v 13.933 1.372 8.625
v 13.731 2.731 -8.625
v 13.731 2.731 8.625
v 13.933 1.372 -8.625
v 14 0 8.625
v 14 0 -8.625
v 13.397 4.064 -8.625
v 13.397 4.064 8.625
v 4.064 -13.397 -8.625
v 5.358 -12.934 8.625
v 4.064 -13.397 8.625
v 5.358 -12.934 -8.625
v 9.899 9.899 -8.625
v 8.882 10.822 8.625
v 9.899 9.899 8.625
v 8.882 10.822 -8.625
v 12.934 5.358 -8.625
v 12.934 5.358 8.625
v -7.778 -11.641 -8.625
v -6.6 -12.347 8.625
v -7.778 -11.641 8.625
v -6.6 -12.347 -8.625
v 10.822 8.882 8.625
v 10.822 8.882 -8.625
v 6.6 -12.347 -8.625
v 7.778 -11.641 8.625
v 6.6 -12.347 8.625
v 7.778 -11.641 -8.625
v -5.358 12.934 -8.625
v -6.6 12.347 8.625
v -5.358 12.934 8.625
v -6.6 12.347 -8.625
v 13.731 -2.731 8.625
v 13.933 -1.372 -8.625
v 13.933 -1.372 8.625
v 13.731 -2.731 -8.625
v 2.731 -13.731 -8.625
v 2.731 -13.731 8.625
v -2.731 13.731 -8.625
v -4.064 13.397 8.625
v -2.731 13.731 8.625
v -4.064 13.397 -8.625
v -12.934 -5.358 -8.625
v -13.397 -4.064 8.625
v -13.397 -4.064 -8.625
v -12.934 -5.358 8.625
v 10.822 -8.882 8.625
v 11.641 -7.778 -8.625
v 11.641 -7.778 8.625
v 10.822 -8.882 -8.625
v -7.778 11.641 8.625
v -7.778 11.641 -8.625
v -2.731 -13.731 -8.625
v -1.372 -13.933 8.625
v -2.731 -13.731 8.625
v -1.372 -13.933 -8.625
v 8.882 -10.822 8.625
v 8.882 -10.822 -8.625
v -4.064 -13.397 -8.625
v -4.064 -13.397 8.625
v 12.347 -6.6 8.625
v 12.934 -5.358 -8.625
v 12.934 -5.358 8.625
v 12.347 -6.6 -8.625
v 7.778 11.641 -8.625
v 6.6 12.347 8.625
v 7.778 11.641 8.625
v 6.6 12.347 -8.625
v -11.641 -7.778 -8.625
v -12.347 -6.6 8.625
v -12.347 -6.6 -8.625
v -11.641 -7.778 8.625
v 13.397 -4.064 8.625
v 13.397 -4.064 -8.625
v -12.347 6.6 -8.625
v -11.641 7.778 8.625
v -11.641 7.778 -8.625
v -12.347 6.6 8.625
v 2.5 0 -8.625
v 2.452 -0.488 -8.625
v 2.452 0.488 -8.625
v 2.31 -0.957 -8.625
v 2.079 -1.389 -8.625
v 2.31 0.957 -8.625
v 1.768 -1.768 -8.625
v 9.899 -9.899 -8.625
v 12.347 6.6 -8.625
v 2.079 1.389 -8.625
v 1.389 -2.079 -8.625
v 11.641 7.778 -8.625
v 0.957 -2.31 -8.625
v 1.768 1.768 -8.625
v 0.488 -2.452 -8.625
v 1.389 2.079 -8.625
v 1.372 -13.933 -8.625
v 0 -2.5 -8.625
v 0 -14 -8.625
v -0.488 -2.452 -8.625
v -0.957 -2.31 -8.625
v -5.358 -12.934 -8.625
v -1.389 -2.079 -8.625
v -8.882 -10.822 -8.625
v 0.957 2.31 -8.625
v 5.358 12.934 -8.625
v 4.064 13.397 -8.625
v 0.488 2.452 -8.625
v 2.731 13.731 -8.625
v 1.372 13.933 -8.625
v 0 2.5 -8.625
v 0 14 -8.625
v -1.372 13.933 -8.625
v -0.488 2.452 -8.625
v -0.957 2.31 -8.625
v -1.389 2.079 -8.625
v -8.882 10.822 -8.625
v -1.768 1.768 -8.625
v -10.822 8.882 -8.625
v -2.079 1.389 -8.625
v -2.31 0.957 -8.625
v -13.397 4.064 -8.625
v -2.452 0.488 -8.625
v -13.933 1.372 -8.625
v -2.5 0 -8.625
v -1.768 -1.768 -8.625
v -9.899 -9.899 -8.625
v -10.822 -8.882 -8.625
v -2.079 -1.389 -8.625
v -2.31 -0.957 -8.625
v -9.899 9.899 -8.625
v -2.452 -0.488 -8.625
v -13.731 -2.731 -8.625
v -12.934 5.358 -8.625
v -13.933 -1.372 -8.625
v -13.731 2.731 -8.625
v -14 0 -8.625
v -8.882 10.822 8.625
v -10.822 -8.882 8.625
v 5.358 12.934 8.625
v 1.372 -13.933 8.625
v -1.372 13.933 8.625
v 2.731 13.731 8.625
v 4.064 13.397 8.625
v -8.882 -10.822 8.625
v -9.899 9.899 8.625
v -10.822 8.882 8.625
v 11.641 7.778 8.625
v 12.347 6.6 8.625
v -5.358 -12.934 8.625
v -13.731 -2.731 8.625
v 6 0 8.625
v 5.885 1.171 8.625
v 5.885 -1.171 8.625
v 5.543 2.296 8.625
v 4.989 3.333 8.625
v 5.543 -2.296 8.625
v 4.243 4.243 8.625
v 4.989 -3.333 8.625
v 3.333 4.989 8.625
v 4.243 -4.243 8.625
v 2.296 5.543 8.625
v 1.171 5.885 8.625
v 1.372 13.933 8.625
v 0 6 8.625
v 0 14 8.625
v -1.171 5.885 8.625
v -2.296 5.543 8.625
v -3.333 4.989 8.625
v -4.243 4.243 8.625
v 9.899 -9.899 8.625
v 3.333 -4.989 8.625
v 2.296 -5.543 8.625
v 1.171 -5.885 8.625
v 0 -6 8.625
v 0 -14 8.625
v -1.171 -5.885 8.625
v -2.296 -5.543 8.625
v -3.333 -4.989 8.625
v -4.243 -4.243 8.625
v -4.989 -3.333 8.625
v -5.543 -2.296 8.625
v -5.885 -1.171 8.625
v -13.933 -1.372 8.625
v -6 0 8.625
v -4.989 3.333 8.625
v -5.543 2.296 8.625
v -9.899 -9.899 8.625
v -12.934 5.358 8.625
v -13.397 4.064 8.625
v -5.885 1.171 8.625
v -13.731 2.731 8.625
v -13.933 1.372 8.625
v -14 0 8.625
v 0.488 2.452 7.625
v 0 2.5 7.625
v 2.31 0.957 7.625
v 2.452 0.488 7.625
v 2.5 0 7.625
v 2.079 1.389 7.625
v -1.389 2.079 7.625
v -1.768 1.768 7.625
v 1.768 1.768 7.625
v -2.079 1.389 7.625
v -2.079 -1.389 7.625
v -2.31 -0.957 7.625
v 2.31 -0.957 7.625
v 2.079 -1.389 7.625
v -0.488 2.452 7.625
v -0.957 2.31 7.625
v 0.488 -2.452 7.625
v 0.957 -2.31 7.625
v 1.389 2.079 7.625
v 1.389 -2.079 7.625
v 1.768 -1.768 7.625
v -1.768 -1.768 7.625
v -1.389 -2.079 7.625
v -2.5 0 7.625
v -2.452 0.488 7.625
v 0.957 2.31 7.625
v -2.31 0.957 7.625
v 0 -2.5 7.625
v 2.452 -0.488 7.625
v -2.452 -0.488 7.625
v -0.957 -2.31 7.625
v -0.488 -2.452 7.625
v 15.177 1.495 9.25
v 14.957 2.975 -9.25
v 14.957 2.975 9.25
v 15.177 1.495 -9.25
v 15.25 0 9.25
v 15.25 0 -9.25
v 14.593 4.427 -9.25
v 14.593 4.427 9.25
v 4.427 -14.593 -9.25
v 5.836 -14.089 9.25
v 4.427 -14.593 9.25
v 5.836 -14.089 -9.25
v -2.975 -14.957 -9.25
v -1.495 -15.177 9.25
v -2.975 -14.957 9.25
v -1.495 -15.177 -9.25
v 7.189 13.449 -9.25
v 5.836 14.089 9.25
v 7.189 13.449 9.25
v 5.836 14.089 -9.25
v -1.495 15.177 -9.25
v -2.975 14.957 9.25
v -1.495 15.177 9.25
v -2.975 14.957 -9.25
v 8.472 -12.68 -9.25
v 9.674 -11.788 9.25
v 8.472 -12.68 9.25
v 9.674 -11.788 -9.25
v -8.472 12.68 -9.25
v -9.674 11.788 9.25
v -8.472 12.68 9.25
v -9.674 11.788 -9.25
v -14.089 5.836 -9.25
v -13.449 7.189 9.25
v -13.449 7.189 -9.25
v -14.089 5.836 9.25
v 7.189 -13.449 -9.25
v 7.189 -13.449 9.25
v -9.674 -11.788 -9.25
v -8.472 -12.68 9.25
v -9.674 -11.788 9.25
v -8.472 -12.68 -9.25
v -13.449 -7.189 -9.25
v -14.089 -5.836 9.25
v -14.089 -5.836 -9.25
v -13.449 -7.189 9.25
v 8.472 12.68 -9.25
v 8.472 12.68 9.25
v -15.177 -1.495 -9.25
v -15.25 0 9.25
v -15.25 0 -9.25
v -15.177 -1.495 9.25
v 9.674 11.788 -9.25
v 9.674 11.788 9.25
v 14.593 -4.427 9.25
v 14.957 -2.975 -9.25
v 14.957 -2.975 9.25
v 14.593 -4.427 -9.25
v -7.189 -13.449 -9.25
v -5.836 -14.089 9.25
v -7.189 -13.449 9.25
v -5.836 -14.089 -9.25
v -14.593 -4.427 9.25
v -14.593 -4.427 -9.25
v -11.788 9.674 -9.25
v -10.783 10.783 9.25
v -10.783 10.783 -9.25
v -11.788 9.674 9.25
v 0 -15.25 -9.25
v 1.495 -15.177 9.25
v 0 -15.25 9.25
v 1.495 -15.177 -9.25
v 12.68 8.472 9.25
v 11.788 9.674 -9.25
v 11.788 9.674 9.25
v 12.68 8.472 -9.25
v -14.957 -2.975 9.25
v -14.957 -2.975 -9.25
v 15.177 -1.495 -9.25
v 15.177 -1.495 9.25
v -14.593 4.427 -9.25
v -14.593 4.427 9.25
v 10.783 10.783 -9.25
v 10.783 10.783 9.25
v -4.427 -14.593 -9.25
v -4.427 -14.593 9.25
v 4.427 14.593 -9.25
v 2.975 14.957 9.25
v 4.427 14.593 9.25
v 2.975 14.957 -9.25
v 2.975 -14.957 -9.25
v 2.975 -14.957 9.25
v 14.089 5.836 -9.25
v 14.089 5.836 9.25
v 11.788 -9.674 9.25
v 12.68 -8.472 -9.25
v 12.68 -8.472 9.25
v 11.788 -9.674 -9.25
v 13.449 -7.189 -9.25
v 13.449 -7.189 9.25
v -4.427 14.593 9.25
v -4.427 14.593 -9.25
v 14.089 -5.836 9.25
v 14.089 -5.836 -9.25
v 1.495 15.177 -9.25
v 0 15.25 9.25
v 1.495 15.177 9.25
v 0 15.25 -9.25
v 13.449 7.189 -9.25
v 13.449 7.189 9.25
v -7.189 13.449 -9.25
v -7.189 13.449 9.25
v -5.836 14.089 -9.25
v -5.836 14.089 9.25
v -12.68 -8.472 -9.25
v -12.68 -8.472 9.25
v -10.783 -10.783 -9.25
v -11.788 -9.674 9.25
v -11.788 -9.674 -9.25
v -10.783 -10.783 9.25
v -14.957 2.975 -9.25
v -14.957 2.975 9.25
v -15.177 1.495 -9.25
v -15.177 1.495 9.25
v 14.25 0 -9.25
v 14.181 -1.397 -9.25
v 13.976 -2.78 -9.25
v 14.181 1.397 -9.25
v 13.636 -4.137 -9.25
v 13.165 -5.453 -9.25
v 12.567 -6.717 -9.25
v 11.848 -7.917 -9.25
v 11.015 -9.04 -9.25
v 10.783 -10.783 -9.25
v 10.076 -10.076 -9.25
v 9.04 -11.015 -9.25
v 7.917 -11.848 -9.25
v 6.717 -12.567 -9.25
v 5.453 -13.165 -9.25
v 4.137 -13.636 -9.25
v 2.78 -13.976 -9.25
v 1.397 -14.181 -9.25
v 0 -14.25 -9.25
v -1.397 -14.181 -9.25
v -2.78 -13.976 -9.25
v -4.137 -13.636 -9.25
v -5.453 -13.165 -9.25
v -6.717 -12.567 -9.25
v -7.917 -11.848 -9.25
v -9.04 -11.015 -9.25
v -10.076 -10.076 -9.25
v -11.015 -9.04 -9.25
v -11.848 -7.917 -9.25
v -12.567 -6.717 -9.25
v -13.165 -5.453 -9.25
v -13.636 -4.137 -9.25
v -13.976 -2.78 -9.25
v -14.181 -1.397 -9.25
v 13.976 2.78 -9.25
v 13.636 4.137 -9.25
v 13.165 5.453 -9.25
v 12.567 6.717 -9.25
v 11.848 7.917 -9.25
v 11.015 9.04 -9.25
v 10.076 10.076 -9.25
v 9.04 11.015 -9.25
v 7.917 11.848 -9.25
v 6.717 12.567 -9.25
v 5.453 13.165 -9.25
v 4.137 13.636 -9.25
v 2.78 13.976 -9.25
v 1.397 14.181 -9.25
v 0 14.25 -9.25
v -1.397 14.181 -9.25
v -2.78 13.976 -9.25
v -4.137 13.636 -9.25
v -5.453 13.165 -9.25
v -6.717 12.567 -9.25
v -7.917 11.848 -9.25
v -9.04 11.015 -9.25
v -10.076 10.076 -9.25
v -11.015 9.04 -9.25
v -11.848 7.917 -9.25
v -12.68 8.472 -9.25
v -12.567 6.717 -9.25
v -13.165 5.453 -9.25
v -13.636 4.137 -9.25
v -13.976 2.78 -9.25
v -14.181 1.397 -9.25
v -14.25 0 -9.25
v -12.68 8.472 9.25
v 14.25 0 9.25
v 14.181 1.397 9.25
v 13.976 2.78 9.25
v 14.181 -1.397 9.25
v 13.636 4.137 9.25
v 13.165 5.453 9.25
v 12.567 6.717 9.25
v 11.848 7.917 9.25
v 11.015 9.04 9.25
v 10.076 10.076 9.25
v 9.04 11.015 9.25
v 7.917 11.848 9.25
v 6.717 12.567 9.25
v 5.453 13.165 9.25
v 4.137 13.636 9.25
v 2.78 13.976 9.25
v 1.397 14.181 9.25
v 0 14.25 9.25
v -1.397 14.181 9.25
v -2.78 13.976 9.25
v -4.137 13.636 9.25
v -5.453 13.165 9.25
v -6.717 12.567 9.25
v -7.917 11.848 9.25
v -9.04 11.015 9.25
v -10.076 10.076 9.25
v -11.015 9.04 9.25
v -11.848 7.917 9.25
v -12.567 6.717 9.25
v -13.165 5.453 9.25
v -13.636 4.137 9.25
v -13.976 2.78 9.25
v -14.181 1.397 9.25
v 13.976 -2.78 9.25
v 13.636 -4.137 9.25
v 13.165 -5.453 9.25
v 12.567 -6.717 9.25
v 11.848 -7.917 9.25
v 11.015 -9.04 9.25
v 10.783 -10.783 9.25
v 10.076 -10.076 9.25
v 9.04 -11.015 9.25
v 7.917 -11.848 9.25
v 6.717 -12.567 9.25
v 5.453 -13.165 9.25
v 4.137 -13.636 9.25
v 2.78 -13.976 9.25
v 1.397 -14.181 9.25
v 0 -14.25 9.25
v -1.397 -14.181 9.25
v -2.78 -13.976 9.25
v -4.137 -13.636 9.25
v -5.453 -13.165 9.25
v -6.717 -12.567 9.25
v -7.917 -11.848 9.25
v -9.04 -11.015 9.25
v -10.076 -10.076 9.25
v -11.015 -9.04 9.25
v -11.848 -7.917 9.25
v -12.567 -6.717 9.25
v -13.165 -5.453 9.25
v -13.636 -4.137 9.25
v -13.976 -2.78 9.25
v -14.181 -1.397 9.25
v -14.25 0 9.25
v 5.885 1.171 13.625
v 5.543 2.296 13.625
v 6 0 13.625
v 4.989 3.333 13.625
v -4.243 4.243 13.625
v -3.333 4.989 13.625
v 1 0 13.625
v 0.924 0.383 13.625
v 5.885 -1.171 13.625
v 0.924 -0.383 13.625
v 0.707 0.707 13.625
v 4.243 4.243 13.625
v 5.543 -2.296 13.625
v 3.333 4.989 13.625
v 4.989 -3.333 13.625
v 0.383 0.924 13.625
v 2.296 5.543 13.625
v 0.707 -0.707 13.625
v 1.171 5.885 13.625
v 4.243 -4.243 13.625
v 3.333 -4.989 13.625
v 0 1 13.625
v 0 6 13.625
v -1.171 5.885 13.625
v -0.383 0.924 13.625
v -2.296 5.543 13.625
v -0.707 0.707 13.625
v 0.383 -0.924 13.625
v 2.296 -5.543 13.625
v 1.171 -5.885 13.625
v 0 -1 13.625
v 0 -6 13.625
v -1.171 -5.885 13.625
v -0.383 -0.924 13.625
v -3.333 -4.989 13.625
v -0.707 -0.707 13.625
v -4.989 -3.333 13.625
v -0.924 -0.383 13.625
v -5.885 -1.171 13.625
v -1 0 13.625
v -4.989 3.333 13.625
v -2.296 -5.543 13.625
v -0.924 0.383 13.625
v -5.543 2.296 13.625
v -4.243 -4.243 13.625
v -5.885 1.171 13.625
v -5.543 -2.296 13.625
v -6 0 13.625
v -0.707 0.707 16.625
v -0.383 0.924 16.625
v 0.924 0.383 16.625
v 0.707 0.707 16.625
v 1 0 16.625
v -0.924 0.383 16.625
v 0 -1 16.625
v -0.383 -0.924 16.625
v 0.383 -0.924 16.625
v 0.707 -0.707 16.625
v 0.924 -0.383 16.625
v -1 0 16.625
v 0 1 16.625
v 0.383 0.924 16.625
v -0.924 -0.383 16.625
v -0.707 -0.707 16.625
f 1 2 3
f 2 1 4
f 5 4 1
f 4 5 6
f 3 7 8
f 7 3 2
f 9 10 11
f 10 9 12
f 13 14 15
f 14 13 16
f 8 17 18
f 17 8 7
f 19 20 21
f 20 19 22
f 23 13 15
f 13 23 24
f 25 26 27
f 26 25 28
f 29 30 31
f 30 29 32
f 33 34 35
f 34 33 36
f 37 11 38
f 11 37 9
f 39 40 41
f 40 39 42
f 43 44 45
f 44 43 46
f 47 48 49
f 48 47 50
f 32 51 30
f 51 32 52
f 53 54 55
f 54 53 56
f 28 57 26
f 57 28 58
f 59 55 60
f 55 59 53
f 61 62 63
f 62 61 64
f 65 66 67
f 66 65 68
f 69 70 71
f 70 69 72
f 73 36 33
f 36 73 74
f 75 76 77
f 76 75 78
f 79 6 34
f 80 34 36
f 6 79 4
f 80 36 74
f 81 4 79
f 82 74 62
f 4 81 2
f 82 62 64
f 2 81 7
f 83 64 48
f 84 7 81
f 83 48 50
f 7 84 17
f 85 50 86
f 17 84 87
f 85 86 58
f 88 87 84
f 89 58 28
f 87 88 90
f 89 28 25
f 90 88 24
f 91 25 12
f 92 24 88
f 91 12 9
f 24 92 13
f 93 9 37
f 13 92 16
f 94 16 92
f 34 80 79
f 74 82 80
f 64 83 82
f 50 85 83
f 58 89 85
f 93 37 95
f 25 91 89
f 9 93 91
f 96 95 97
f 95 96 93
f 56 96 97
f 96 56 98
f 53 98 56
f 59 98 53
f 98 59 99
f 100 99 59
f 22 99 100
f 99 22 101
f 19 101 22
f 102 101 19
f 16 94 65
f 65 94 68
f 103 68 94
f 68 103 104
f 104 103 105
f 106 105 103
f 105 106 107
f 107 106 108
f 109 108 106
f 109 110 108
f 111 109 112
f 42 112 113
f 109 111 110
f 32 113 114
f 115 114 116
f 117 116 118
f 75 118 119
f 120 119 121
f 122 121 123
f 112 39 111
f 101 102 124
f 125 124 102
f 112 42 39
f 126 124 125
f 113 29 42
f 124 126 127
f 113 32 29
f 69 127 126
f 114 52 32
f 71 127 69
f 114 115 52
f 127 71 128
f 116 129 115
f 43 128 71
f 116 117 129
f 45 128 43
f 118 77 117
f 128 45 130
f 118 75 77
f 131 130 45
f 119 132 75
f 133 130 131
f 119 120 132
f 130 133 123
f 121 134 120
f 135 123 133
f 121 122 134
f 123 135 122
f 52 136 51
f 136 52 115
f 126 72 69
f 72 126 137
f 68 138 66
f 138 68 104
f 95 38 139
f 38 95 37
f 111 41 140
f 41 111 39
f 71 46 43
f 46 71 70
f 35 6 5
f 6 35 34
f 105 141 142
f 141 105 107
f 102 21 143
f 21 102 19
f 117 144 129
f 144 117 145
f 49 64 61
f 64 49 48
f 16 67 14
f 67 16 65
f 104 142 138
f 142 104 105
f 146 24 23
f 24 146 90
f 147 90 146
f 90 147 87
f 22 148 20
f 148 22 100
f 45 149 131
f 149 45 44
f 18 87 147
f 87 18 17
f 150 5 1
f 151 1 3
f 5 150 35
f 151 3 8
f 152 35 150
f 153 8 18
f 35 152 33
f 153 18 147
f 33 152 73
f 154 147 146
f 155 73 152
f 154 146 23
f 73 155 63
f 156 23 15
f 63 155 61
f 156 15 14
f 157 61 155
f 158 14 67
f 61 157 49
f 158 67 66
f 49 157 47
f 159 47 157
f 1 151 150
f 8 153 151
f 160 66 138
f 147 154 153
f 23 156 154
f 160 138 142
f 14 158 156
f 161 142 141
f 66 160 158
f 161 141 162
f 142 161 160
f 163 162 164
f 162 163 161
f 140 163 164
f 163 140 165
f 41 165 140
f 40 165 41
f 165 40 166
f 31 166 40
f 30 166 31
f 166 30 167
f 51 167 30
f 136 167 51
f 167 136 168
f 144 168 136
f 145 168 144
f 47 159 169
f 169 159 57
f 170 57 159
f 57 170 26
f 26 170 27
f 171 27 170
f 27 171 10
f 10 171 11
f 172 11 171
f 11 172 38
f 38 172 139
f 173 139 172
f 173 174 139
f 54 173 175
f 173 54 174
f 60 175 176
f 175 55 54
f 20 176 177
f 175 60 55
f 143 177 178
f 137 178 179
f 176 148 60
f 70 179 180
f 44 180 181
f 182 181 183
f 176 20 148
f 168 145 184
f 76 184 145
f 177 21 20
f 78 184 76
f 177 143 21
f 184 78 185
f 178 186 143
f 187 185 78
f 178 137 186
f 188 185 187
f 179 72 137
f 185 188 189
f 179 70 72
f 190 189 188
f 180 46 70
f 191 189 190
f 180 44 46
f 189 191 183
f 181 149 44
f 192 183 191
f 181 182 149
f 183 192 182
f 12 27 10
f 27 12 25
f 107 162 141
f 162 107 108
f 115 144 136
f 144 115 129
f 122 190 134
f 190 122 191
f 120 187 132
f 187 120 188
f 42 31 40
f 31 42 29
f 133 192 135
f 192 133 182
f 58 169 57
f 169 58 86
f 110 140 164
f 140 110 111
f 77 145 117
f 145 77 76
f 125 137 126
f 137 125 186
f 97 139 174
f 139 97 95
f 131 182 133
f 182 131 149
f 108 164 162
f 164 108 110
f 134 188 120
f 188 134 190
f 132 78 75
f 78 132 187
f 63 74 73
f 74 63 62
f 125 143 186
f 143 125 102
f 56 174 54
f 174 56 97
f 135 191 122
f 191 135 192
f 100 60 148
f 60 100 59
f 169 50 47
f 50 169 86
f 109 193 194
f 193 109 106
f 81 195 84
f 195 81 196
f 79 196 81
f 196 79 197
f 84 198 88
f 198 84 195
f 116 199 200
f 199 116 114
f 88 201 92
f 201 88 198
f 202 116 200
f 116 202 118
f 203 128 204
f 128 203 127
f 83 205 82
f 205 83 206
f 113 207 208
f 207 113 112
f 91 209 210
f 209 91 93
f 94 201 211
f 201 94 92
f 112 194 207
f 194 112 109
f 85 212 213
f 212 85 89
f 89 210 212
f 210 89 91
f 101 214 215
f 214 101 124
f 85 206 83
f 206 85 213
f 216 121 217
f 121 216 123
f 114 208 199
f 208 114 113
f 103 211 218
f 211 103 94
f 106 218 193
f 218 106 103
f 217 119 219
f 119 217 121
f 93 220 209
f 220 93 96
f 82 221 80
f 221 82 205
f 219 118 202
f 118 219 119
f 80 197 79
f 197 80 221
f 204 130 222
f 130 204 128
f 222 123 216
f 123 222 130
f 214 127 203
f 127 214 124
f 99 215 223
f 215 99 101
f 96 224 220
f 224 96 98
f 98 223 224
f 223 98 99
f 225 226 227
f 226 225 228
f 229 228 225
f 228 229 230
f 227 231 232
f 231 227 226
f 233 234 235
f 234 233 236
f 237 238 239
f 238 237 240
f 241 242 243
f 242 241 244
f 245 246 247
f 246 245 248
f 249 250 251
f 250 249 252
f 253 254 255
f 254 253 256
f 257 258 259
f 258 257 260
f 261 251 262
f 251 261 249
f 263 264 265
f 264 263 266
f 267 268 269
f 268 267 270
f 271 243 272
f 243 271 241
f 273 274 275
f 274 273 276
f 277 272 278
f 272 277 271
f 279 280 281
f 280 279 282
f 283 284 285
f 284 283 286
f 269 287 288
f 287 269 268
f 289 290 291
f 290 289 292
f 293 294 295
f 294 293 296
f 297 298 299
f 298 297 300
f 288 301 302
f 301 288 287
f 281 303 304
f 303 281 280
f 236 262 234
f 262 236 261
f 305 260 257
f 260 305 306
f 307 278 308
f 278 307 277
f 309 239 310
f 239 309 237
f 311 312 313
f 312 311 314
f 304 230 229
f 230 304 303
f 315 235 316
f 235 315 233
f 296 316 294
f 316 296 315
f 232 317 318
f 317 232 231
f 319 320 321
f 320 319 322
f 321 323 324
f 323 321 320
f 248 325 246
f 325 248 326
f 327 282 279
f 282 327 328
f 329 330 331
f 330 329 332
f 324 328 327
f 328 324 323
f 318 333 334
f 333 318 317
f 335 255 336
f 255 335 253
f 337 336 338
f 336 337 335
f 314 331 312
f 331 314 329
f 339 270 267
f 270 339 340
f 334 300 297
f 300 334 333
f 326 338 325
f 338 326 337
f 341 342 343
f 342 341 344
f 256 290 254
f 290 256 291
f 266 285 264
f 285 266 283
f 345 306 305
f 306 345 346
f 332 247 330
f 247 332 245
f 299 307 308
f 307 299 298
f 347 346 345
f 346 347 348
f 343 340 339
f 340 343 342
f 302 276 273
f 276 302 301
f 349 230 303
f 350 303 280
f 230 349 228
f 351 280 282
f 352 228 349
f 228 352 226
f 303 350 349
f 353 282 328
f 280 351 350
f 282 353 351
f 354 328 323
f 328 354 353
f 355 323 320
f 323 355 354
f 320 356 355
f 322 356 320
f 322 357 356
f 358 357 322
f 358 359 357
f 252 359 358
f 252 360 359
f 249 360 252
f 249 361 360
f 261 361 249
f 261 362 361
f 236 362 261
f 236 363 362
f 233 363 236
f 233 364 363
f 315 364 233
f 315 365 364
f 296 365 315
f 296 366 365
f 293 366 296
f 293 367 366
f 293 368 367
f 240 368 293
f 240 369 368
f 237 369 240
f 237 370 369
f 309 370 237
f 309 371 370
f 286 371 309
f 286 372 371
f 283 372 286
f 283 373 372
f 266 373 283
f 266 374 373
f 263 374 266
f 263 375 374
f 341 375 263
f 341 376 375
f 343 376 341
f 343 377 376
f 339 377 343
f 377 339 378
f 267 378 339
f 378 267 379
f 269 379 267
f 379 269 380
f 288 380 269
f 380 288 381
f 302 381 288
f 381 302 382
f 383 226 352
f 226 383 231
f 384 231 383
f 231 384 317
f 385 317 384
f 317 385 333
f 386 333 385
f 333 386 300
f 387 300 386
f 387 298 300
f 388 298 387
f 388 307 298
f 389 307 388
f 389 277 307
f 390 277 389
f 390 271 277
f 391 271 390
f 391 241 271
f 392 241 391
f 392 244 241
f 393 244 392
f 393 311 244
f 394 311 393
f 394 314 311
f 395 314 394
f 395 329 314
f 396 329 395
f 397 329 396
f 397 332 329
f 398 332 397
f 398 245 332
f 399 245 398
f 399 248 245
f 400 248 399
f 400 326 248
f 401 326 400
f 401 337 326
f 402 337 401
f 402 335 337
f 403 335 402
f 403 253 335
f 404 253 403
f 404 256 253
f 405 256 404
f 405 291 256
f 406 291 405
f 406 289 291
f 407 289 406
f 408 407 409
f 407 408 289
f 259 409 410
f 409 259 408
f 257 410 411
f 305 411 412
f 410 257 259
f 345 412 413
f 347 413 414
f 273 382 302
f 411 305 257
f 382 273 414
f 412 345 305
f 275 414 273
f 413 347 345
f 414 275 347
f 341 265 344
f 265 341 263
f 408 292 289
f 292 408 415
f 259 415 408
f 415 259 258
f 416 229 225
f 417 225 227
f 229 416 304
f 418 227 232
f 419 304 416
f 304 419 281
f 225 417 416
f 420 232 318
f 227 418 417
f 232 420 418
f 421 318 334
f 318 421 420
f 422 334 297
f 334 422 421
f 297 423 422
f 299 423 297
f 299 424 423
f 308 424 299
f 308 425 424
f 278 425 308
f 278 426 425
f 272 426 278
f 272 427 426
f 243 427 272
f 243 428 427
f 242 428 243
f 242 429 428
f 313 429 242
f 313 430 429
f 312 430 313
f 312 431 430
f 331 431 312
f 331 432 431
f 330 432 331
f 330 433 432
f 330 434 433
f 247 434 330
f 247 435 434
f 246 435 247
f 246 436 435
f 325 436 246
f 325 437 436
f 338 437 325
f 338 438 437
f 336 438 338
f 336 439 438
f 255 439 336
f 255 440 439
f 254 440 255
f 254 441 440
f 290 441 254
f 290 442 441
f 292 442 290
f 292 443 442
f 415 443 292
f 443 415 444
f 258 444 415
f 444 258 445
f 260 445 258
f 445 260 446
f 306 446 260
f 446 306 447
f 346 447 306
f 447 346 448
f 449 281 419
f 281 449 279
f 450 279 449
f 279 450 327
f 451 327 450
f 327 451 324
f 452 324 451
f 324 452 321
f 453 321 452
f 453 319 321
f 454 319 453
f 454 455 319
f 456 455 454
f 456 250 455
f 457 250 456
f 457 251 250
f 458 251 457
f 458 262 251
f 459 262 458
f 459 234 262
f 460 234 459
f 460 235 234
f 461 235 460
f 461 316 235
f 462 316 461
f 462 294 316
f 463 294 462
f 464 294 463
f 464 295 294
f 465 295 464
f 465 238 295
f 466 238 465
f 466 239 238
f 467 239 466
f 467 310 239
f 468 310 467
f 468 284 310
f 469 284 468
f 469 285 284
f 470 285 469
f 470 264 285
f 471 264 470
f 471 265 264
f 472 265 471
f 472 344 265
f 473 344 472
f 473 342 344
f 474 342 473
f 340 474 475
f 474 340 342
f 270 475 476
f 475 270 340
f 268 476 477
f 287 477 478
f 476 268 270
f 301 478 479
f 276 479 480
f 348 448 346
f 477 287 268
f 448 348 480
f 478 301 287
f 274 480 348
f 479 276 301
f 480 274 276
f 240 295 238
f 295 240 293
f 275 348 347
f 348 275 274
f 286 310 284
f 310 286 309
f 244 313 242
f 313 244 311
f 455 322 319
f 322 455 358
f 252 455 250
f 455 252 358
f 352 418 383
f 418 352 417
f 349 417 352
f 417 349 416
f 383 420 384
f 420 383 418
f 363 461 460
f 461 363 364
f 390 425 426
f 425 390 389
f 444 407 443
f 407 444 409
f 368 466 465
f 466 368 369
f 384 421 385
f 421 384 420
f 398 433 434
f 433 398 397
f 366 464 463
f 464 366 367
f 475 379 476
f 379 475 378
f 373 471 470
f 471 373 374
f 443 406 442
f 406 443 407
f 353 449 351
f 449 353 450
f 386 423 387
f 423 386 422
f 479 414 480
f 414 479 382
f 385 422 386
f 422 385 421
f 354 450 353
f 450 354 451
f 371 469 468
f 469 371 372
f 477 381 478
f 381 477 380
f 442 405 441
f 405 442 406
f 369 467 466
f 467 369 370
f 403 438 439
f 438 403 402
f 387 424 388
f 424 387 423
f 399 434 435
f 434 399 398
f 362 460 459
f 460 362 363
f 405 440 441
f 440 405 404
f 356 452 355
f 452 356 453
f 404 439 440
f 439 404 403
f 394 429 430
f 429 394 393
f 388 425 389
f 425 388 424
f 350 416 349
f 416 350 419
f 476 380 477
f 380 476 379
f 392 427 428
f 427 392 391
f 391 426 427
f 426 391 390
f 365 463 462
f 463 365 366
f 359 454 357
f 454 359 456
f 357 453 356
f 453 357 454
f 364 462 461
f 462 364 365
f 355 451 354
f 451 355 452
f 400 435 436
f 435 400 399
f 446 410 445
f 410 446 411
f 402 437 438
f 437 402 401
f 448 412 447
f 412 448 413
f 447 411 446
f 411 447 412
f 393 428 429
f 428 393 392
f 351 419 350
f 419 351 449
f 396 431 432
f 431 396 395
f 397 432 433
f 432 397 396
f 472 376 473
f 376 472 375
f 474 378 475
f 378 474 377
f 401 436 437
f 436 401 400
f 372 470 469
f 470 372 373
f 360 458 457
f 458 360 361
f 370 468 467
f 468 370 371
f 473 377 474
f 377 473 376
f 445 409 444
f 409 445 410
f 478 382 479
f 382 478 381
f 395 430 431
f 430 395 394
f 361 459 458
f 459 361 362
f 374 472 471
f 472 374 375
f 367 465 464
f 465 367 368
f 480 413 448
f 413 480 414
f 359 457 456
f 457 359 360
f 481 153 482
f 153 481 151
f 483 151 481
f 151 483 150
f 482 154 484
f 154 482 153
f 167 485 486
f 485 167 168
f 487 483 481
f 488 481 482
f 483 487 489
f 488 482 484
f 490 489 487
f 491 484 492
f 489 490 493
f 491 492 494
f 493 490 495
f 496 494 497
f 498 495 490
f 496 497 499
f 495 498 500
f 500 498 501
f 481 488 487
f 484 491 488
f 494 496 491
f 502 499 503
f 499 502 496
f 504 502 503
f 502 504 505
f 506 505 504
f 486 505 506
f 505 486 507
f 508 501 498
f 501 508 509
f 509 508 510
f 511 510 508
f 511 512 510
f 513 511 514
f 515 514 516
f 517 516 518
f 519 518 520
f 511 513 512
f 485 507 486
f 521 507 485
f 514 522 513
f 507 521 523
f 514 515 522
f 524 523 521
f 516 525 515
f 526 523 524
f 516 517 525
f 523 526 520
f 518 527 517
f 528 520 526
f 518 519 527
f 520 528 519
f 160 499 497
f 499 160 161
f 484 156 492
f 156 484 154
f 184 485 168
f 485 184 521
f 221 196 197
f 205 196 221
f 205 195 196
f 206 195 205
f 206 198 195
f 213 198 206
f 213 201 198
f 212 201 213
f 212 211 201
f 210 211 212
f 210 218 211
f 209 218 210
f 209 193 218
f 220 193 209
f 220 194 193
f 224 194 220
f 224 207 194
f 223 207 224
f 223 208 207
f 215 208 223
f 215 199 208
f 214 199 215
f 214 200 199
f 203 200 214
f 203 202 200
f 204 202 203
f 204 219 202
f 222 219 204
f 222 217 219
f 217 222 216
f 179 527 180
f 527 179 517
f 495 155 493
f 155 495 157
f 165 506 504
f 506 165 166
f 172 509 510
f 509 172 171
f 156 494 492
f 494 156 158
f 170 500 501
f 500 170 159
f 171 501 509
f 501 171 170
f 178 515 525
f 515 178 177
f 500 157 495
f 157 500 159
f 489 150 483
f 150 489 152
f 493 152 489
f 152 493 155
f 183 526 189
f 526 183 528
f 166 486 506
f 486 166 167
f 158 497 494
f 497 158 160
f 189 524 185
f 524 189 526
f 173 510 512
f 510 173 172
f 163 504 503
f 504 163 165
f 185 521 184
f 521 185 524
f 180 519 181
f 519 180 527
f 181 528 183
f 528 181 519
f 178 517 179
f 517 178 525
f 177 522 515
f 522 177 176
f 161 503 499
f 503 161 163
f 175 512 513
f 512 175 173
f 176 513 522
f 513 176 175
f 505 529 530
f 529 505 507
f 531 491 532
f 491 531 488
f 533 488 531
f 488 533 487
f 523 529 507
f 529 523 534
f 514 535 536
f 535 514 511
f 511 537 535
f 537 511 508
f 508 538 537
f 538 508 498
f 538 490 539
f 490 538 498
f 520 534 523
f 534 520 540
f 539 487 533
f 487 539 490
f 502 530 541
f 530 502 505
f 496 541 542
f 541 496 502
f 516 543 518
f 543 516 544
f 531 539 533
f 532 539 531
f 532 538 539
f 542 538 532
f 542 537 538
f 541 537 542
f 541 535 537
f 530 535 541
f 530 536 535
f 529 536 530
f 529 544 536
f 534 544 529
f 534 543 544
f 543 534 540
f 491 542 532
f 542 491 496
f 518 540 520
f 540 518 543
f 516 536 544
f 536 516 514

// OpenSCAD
// Parameters
stator_diameter = 28.0; //[14.0:56.0:0.25]
stator_height = 17.25; //[8.625:34.5:0.25]
central_bore_diameter = 5.0; //[2.5:10.0:0.25]
outer_can_diameter = 30.0; //[15.0:60.0:0.25]
outer_can_height = 18.0; //[9.0:36.0:0.25]
clearance_radial = 0.25; //[0.1:1.0:0.05]
clearance_axial = 0.25; //[0.1:1.0:0.05]
overlap = 1.0; //[0.5:2.0:0.1]
can_wall = 1.0; //[0.6:2.5:0.1]
buzzer_diameter = 12.0; //[6.0:24.0:0.5]
buzzer_height = 6.0; //[3.0:12.0:0.25]
buzzer_pin_diameter = 2.0; //[1.0:4.0:0.25]
buzzer_pin_height = 3.0; //[1.0:8.0:0.25]

// Buzzer - complete geometry
module buzzer() {
  color([0.85, 0.85, 0.8]) {
    // Buzzer body
    translate([0, 0, stator_height/2 + buzzer_height/2 - overlap])
      cylinder(r=buzzer_diameter/2, h=buzzer_height, center=true, $fn=32);
    // Buzzer pin
    translate([0, 0, stator_height/2 + buzzer_height - overlap + buzzer_pin_height/2])
      cylinder(r=buzzer_pin_diameter/2, h=buzzer_pin_height, center=true, $fn=16);
  }
}

// Motor assembly
module assembly() {
  // Stator with central bore
  color("DimGray") {
    difference() {
      translate([0, 0, 0])
        cylinder(r=stator_diameter/2, h=stator_height, center=true, $fn=64);
      translate([0, 0, 0])
        cylinder(r=central_bore_diameter/2, h=stator_height + 2*overlap, center=true, $fn=32);
    }
  }
  
  // Outer can envelope
  color("Black") {
    difference() {
      translate([0, 0, 0])
        cylinder(r=outer_can_diameter/2 + clearance_radial, h=outer_can_height + 2*clearance_axial, center=true, $fn=64);
      translate([0, 0, 0])
        cylinder(r=outer_can_diameter/2 + clearance_radial - can_wall, h=outer_can_height + 2*clearance_axial + 2*overlap, center=true, $fn=64);
    }
  }
  
  // Buzzer
  buzzer();
}

assembly();
